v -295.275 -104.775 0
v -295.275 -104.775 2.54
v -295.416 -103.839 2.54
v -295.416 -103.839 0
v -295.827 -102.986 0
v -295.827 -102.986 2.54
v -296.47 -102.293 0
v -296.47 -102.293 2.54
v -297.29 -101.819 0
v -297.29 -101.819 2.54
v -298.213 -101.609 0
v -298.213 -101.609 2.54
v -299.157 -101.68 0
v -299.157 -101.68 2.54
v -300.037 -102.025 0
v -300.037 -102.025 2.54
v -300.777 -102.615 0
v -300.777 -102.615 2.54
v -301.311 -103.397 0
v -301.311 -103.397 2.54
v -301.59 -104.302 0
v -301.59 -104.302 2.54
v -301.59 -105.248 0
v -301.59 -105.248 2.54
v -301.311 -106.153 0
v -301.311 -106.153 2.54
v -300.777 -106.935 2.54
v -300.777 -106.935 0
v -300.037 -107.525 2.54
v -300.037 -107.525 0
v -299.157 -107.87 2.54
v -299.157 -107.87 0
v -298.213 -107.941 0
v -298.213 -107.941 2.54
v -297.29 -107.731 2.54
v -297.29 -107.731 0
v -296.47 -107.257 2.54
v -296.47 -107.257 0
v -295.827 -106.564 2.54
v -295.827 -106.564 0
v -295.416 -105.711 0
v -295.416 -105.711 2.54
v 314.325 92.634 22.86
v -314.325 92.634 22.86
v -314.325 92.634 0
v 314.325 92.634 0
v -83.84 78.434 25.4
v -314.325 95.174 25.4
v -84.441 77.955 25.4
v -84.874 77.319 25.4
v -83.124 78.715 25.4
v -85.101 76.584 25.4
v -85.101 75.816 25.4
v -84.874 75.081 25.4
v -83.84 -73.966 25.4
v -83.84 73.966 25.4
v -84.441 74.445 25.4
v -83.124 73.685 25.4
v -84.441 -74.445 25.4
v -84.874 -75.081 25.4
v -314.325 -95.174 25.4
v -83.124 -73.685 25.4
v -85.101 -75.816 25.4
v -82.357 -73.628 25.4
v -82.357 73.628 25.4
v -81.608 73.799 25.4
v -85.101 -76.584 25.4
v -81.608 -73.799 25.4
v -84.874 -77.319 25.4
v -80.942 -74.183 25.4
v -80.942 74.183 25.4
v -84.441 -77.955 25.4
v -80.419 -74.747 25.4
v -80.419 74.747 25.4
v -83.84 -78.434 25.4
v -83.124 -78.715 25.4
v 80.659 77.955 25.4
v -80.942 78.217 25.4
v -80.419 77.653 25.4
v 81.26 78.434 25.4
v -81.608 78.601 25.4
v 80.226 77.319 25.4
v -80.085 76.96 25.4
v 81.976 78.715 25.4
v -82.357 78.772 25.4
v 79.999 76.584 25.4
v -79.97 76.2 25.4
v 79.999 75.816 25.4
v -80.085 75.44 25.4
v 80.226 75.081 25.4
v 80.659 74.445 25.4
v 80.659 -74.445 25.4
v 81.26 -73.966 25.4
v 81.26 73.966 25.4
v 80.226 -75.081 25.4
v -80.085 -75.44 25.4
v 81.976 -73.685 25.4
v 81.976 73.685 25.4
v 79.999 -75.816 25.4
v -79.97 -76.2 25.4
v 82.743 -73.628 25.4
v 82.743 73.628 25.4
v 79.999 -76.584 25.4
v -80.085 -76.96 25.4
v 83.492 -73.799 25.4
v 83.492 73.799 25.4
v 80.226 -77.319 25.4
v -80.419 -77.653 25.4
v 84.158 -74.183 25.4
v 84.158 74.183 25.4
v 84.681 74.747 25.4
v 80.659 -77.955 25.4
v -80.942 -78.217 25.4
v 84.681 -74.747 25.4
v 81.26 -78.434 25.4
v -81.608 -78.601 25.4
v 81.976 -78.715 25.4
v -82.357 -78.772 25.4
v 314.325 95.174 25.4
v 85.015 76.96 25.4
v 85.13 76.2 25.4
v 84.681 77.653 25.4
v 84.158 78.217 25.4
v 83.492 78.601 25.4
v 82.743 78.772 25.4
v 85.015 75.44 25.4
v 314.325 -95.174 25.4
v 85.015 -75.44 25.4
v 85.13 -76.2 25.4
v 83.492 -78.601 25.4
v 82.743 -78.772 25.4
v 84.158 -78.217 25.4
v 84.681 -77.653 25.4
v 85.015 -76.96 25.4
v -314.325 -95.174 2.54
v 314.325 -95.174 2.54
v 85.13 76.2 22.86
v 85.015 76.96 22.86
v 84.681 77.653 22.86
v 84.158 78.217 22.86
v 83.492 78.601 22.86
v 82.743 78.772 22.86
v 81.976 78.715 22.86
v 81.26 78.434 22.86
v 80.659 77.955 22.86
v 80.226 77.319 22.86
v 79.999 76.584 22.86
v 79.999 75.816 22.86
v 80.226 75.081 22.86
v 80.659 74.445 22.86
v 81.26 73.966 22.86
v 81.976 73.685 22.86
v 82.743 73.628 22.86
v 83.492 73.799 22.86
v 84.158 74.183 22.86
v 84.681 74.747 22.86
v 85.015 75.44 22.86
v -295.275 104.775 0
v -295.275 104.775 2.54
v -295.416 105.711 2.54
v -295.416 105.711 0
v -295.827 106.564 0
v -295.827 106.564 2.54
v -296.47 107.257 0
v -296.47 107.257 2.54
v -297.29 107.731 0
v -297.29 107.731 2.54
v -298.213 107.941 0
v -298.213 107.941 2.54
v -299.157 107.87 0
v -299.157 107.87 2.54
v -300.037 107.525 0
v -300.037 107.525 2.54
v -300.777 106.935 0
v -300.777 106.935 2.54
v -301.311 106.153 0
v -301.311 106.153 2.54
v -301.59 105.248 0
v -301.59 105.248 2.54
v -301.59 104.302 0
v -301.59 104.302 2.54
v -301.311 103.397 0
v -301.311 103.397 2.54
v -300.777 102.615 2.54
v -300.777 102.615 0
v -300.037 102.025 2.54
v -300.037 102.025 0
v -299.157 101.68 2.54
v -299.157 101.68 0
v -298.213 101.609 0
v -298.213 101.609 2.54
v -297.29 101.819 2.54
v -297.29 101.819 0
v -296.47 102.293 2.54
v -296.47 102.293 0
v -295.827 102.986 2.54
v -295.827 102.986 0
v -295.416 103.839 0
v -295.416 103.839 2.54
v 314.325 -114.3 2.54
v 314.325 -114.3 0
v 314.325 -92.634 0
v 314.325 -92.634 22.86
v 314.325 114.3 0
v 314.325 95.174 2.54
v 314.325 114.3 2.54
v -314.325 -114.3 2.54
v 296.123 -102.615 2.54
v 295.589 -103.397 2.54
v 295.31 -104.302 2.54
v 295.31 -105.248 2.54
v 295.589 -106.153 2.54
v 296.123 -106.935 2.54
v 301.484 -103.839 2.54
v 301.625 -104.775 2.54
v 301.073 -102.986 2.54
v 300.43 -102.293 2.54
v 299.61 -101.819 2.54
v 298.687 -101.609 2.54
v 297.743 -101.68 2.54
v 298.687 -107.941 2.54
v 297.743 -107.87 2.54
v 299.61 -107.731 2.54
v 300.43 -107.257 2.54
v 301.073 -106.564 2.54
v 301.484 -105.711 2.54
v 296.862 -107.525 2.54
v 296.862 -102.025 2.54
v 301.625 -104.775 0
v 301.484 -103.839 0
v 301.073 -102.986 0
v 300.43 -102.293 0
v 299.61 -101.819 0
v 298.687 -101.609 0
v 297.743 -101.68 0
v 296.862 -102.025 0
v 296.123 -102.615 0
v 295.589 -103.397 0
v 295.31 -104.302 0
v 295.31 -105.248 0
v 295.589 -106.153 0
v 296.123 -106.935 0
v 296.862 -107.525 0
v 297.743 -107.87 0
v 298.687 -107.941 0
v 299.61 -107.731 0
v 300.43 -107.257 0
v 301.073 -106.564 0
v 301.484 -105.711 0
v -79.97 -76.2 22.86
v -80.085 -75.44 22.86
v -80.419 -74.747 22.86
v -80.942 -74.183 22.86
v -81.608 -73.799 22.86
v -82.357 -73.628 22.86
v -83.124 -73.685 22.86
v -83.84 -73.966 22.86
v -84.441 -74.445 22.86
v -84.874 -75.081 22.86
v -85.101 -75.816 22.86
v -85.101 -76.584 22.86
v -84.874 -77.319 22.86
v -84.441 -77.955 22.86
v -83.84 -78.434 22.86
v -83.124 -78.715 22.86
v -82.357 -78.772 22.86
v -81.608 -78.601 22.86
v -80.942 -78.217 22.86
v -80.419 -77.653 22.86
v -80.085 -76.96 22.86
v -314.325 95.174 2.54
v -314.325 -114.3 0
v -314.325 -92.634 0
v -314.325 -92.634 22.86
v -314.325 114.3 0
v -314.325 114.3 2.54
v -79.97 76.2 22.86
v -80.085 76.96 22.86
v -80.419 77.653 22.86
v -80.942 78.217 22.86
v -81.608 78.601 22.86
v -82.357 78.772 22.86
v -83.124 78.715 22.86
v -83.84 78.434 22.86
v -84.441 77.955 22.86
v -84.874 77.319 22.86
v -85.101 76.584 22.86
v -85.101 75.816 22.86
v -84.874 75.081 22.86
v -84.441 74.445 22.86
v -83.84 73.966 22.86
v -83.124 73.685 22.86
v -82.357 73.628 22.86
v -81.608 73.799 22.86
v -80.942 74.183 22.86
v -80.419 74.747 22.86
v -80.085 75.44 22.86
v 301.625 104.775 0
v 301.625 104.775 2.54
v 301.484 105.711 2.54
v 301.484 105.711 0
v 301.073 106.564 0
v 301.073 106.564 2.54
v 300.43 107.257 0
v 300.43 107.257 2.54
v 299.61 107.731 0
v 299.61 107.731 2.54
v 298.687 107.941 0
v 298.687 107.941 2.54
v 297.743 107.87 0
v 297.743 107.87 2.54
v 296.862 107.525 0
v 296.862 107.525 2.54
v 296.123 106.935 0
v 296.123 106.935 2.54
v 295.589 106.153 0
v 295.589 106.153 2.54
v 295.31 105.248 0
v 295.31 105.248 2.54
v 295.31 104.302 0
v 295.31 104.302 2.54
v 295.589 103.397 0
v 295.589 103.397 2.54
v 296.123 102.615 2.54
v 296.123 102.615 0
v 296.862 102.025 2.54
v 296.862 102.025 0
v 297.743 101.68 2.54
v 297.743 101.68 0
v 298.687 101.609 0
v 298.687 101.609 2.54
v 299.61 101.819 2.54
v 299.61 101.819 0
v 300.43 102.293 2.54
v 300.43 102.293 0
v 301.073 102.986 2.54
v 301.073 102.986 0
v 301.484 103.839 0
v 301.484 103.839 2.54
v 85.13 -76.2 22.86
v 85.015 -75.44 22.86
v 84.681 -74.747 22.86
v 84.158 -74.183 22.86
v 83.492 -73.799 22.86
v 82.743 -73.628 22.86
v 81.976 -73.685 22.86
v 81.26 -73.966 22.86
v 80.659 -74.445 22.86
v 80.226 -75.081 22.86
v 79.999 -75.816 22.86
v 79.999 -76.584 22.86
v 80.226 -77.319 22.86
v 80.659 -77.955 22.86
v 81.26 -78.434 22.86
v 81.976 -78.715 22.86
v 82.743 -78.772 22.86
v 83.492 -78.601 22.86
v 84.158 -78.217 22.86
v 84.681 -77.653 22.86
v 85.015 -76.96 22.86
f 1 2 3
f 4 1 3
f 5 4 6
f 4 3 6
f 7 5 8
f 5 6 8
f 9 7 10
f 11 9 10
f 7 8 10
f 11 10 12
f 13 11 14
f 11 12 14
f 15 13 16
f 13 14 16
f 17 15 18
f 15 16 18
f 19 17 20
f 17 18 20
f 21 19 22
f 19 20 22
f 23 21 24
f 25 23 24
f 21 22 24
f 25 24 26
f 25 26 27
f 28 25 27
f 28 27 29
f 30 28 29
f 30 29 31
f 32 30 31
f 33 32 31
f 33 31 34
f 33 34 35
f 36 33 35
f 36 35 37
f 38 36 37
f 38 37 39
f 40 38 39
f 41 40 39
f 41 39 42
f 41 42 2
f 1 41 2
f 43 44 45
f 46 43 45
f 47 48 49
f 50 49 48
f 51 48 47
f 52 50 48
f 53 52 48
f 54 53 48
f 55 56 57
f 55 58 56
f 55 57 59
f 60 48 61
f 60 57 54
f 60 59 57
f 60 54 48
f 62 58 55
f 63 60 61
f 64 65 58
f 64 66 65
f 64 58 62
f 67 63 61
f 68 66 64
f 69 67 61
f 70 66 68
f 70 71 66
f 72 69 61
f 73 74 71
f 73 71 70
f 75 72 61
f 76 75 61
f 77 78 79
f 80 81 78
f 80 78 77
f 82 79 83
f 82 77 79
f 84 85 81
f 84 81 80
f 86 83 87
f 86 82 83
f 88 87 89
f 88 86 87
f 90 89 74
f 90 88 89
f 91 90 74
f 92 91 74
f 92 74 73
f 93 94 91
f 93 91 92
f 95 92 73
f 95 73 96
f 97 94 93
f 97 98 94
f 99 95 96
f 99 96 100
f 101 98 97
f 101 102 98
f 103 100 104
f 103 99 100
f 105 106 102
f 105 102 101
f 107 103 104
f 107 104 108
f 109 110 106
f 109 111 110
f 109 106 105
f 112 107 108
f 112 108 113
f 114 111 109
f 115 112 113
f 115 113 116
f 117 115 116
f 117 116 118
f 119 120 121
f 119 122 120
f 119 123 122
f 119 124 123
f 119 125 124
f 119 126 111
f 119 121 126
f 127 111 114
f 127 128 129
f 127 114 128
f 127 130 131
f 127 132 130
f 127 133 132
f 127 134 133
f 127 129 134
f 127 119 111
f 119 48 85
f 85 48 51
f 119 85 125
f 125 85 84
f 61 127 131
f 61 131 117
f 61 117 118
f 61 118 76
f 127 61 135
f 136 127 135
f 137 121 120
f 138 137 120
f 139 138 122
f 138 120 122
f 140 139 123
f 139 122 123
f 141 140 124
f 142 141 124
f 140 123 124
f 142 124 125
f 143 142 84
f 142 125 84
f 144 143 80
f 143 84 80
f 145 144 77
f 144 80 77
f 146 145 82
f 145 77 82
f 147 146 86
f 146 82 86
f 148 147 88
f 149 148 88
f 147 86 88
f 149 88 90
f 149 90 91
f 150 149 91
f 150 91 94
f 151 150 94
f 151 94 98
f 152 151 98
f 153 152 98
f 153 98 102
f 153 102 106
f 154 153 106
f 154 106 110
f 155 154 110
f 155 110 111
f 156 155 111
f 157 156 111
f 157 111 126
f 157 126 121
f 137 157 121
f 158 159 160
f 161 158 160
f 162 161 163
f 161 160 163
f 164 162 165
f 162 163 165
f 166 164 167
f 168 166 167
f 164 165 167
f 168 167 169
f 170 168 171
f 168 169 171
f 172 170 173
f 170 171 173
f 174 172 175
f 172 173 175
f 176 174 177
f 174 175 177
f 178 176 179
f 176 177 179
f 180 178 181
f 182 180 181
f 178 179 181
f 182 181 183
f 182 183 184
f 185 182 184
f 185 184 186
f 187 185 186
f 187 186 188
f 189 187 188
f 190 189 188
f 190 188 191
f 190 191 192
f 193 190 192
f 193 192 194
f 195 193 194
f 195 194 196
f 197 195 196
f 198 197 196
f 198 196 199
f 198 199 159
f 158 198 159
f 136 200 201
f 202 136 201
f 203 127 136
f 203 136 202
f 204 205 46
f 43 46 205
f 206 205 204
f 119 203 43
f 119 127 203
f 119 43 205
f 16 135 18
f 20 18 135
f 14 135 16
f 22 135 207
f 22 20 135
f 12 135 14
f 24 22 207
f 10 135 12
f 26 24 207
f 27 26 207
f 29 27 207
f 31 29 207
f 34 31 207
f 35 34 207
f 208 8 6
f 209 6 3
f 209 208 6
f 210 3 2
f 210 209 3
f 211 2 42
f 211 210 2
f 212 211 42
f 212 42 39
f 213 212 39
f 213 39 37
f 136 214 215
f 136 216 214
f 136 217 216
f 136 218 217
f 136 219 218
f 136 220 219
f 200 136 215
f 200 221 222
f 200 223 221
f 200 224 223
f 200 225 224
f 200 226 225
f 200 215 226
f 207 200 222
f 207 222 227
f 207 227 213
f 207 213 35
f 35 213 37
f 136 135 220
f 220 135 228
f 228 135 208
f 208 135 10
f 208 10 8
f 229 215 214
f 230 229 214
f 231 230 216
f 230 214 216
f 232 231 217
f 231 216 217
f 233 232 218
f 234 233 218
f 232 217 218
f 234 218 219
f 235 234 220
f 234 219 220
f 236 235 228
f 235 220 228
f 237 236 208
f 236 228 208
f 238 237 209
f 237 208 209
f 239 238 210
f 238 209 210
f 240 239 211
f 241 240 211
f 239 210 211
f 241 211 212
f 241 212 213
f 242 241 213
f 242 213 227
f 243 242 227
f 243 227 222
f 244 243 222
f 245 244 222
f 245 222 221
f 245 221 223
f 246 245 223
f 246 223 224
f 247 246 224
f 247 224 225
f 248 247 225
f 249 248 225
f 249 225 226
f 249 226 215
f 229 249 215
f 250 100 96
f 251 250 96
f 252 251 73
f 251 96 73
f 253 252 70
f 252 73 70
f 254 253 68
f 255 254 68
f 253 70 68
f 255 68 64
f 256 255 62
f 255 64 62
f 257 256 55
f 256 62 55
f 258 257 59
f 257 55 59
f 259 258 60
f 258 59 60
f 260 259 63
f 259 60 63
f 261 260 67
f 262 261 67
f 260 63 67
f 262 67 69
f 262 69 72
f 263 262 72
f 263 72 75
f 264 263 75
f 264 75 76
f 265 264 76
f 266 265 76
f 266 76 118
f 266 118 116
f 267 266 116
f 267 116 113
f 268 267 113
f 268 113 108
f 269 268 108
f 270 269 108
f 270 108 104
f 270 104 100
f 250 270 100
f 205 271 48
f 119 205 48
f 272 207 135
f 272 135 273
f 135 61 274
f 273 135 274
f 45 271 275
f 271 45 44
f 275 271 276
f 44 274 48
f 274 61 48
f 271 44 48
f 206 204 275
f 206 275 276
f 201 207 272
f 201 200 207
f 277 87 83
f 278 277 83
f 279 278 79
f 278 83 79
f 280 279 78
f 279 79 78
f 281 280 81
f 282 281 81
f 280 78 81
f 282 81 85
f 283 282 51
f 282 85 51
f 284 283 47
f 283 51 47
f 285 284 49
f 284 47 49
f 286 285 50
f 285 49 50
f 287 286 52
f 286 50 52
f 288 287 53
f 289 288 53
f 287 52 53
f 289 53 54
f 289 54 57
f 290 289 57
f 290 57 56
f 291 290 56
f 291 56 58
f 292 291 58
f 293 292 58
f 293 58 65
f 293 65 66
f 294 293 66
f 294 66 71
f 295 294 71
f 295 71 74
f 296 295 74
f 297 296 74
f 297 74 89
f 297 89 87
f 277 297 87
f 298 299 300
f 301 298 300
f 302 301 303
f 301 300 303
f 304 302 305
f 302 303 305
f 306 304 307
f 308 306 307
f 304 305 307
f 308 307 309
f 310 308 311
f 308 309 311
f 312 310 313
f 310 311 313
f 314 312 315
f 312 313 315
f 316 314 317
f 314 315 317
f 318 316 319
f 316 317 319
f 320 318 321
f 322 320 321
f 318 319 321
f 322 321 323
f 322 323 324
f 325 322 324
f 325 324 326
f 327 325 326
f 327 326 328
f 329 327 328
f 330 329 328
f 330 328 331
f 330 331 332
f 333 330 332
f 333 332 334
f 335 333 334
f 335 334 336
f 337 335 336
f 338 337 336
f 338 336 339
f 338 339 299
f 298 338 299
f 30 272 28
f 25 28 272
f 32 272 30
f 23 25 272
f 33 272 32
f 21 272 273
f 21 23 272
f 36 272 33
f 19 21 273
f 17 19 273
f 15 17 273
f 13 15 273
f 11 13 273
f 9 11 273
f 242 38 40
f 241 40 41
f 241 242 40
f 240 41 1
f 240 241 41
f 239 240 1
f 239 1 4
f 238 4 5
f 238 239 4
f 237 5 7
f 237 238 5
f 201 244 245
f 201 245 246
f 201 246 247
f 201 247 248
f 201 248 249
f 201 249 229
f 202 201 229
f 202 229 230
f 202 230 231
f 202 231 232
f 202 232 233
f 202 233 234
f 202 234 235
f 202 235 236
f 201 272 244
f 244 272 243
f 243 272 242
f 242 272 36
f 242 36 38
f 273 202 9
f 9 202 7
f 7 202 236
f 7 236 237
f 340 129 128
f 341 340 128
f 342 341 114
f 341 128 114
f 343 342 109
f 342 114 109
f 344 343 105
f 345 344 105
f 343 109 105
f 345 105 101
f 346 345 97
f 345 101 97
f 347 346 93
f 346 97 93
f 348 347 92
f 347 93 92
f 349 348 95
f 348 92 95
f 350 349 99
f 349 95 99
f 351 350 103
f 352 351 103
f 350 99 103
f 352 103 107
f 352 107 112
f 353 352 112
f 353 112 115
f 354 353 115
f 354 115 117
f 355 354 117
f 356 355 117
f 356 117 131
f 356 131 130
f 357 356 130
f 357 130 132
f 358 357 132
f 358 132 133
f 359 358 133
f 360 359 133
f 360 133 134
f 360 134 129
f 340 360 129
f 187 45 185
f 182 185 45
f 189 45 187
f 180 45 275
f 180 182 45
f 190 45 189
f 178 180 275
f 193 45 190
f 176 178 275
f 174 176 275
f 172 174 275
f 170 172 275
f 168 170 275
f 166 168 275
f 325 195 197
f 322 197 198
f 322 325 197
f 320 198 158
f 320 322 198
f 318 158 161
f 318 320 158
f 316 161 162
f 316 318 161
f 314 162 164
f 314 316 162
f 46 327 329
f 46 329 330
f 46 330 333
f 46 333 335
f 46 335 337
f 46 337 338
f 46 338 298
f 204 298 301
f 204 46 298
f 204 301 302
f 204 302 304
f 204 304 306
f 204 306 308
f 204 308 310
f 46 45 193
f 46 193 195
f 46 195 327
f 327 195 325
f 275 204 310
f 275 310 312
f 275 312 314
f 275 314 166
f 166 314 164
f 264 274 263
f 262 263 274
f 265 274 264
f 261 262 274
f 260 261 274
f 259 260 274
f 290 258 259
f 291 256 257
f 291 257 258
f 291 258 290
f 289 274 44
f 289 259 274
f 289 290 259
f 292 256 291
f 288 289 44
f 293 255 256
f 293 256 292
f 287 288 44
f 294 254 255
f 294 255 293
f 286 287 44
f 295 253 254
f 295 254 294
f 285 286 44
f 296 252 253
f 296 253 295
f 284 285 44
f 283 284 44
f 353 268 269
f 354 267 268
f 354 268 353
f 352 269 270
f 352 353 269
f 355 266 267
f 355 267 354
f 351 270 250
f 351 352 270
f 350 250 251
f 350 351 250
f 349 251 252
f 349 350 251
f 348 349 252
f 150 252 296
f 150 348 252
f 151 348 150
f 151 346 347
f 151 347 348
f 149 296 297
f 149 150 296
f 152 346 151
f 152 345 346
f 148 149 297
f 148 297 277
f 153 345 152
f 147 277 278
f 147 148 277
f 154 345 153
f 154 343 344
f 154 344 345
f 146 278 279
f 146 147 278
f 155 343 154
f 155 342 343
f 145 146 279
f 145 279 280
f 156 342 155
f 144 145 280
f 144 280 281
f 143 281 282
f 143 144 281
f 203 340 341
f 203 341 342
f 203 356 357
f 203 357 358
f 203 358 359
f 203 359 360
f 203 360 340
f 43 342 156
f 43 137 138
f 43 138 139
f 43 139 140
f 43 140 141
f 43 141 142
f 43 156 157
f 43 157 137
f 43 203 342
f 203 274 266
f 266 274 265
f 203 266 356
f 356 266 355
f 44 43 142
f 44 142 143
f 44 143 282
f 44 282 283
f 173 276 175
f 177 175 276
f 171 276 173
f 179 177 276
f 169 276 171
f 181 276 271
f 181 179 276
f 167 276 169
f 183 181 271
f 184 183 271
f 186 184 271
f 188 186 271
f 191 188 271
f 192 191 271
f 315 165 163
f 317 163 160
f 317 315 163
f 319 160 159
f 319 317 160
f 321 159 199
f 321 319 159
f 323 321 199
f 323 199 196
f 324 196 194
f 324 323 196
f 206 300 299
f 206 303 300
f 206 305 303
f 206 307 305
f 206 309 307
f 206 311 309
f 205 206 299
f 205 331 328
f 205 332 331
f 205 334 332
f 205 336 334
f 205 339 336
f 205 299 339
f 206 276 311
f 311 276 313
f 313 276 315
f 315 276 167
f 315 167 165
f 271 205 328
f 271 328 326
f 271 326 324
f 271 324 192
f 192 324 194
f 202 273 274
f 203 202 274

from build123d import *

# Parameters (mm, degrees)
F1_DEPTH = 314.325
F2_R     = 2.579688
F2_R_2   = 3.175
F3_DEPTH = 25.401


with BuildPart() as f1:
    # F0 (on Right) → F1 (new body, symmetric)
    with BuildSketch(Plane.YZ):
        Polygon((-114.3, 2.54), (-114.3, 0), (-92.6338, 0), (-92.6338, 22.86), (92.6338, 22.86), (92.6338, 0), (114.3, 0), (114.3, 2.54), (95.1738, 2.54), (95.1738, 25.4), (-95.1738, 25.4), (-95.1738, 2.54), align=None)
    extrude(amount=F1_DEPTH, both=True)

    # F2 (on face) → F3 (cut, through all)
    with BuildSketch(Plane.XY.offset(25.4)):
        with Locations((-82.55, 76.2)):
            Circle(F2_R)
        with Locations((-82.55, -76.2)):
            Circle(F2_R)
        with Locations((82.55, -76.2)):
            Circle(F2_R)
        with Locations((82.55, 76.2)):
            Circle(F2_R)
        with Locations((298.45, 104.775)):
            Circle(F2_R_2)
        with Locations((298.45, -104.775)):
            Circle(F2_R_2)
        with Locations((-298.45, -104.775)):
            Circle(F2_R_2)
        with Locations((-298.45, 104.775)):
            Circle(F2_R_2)
    extrude(amount=-F3_DEPTH, mode=Mode.SUBTRACT)


solid = f1.part
